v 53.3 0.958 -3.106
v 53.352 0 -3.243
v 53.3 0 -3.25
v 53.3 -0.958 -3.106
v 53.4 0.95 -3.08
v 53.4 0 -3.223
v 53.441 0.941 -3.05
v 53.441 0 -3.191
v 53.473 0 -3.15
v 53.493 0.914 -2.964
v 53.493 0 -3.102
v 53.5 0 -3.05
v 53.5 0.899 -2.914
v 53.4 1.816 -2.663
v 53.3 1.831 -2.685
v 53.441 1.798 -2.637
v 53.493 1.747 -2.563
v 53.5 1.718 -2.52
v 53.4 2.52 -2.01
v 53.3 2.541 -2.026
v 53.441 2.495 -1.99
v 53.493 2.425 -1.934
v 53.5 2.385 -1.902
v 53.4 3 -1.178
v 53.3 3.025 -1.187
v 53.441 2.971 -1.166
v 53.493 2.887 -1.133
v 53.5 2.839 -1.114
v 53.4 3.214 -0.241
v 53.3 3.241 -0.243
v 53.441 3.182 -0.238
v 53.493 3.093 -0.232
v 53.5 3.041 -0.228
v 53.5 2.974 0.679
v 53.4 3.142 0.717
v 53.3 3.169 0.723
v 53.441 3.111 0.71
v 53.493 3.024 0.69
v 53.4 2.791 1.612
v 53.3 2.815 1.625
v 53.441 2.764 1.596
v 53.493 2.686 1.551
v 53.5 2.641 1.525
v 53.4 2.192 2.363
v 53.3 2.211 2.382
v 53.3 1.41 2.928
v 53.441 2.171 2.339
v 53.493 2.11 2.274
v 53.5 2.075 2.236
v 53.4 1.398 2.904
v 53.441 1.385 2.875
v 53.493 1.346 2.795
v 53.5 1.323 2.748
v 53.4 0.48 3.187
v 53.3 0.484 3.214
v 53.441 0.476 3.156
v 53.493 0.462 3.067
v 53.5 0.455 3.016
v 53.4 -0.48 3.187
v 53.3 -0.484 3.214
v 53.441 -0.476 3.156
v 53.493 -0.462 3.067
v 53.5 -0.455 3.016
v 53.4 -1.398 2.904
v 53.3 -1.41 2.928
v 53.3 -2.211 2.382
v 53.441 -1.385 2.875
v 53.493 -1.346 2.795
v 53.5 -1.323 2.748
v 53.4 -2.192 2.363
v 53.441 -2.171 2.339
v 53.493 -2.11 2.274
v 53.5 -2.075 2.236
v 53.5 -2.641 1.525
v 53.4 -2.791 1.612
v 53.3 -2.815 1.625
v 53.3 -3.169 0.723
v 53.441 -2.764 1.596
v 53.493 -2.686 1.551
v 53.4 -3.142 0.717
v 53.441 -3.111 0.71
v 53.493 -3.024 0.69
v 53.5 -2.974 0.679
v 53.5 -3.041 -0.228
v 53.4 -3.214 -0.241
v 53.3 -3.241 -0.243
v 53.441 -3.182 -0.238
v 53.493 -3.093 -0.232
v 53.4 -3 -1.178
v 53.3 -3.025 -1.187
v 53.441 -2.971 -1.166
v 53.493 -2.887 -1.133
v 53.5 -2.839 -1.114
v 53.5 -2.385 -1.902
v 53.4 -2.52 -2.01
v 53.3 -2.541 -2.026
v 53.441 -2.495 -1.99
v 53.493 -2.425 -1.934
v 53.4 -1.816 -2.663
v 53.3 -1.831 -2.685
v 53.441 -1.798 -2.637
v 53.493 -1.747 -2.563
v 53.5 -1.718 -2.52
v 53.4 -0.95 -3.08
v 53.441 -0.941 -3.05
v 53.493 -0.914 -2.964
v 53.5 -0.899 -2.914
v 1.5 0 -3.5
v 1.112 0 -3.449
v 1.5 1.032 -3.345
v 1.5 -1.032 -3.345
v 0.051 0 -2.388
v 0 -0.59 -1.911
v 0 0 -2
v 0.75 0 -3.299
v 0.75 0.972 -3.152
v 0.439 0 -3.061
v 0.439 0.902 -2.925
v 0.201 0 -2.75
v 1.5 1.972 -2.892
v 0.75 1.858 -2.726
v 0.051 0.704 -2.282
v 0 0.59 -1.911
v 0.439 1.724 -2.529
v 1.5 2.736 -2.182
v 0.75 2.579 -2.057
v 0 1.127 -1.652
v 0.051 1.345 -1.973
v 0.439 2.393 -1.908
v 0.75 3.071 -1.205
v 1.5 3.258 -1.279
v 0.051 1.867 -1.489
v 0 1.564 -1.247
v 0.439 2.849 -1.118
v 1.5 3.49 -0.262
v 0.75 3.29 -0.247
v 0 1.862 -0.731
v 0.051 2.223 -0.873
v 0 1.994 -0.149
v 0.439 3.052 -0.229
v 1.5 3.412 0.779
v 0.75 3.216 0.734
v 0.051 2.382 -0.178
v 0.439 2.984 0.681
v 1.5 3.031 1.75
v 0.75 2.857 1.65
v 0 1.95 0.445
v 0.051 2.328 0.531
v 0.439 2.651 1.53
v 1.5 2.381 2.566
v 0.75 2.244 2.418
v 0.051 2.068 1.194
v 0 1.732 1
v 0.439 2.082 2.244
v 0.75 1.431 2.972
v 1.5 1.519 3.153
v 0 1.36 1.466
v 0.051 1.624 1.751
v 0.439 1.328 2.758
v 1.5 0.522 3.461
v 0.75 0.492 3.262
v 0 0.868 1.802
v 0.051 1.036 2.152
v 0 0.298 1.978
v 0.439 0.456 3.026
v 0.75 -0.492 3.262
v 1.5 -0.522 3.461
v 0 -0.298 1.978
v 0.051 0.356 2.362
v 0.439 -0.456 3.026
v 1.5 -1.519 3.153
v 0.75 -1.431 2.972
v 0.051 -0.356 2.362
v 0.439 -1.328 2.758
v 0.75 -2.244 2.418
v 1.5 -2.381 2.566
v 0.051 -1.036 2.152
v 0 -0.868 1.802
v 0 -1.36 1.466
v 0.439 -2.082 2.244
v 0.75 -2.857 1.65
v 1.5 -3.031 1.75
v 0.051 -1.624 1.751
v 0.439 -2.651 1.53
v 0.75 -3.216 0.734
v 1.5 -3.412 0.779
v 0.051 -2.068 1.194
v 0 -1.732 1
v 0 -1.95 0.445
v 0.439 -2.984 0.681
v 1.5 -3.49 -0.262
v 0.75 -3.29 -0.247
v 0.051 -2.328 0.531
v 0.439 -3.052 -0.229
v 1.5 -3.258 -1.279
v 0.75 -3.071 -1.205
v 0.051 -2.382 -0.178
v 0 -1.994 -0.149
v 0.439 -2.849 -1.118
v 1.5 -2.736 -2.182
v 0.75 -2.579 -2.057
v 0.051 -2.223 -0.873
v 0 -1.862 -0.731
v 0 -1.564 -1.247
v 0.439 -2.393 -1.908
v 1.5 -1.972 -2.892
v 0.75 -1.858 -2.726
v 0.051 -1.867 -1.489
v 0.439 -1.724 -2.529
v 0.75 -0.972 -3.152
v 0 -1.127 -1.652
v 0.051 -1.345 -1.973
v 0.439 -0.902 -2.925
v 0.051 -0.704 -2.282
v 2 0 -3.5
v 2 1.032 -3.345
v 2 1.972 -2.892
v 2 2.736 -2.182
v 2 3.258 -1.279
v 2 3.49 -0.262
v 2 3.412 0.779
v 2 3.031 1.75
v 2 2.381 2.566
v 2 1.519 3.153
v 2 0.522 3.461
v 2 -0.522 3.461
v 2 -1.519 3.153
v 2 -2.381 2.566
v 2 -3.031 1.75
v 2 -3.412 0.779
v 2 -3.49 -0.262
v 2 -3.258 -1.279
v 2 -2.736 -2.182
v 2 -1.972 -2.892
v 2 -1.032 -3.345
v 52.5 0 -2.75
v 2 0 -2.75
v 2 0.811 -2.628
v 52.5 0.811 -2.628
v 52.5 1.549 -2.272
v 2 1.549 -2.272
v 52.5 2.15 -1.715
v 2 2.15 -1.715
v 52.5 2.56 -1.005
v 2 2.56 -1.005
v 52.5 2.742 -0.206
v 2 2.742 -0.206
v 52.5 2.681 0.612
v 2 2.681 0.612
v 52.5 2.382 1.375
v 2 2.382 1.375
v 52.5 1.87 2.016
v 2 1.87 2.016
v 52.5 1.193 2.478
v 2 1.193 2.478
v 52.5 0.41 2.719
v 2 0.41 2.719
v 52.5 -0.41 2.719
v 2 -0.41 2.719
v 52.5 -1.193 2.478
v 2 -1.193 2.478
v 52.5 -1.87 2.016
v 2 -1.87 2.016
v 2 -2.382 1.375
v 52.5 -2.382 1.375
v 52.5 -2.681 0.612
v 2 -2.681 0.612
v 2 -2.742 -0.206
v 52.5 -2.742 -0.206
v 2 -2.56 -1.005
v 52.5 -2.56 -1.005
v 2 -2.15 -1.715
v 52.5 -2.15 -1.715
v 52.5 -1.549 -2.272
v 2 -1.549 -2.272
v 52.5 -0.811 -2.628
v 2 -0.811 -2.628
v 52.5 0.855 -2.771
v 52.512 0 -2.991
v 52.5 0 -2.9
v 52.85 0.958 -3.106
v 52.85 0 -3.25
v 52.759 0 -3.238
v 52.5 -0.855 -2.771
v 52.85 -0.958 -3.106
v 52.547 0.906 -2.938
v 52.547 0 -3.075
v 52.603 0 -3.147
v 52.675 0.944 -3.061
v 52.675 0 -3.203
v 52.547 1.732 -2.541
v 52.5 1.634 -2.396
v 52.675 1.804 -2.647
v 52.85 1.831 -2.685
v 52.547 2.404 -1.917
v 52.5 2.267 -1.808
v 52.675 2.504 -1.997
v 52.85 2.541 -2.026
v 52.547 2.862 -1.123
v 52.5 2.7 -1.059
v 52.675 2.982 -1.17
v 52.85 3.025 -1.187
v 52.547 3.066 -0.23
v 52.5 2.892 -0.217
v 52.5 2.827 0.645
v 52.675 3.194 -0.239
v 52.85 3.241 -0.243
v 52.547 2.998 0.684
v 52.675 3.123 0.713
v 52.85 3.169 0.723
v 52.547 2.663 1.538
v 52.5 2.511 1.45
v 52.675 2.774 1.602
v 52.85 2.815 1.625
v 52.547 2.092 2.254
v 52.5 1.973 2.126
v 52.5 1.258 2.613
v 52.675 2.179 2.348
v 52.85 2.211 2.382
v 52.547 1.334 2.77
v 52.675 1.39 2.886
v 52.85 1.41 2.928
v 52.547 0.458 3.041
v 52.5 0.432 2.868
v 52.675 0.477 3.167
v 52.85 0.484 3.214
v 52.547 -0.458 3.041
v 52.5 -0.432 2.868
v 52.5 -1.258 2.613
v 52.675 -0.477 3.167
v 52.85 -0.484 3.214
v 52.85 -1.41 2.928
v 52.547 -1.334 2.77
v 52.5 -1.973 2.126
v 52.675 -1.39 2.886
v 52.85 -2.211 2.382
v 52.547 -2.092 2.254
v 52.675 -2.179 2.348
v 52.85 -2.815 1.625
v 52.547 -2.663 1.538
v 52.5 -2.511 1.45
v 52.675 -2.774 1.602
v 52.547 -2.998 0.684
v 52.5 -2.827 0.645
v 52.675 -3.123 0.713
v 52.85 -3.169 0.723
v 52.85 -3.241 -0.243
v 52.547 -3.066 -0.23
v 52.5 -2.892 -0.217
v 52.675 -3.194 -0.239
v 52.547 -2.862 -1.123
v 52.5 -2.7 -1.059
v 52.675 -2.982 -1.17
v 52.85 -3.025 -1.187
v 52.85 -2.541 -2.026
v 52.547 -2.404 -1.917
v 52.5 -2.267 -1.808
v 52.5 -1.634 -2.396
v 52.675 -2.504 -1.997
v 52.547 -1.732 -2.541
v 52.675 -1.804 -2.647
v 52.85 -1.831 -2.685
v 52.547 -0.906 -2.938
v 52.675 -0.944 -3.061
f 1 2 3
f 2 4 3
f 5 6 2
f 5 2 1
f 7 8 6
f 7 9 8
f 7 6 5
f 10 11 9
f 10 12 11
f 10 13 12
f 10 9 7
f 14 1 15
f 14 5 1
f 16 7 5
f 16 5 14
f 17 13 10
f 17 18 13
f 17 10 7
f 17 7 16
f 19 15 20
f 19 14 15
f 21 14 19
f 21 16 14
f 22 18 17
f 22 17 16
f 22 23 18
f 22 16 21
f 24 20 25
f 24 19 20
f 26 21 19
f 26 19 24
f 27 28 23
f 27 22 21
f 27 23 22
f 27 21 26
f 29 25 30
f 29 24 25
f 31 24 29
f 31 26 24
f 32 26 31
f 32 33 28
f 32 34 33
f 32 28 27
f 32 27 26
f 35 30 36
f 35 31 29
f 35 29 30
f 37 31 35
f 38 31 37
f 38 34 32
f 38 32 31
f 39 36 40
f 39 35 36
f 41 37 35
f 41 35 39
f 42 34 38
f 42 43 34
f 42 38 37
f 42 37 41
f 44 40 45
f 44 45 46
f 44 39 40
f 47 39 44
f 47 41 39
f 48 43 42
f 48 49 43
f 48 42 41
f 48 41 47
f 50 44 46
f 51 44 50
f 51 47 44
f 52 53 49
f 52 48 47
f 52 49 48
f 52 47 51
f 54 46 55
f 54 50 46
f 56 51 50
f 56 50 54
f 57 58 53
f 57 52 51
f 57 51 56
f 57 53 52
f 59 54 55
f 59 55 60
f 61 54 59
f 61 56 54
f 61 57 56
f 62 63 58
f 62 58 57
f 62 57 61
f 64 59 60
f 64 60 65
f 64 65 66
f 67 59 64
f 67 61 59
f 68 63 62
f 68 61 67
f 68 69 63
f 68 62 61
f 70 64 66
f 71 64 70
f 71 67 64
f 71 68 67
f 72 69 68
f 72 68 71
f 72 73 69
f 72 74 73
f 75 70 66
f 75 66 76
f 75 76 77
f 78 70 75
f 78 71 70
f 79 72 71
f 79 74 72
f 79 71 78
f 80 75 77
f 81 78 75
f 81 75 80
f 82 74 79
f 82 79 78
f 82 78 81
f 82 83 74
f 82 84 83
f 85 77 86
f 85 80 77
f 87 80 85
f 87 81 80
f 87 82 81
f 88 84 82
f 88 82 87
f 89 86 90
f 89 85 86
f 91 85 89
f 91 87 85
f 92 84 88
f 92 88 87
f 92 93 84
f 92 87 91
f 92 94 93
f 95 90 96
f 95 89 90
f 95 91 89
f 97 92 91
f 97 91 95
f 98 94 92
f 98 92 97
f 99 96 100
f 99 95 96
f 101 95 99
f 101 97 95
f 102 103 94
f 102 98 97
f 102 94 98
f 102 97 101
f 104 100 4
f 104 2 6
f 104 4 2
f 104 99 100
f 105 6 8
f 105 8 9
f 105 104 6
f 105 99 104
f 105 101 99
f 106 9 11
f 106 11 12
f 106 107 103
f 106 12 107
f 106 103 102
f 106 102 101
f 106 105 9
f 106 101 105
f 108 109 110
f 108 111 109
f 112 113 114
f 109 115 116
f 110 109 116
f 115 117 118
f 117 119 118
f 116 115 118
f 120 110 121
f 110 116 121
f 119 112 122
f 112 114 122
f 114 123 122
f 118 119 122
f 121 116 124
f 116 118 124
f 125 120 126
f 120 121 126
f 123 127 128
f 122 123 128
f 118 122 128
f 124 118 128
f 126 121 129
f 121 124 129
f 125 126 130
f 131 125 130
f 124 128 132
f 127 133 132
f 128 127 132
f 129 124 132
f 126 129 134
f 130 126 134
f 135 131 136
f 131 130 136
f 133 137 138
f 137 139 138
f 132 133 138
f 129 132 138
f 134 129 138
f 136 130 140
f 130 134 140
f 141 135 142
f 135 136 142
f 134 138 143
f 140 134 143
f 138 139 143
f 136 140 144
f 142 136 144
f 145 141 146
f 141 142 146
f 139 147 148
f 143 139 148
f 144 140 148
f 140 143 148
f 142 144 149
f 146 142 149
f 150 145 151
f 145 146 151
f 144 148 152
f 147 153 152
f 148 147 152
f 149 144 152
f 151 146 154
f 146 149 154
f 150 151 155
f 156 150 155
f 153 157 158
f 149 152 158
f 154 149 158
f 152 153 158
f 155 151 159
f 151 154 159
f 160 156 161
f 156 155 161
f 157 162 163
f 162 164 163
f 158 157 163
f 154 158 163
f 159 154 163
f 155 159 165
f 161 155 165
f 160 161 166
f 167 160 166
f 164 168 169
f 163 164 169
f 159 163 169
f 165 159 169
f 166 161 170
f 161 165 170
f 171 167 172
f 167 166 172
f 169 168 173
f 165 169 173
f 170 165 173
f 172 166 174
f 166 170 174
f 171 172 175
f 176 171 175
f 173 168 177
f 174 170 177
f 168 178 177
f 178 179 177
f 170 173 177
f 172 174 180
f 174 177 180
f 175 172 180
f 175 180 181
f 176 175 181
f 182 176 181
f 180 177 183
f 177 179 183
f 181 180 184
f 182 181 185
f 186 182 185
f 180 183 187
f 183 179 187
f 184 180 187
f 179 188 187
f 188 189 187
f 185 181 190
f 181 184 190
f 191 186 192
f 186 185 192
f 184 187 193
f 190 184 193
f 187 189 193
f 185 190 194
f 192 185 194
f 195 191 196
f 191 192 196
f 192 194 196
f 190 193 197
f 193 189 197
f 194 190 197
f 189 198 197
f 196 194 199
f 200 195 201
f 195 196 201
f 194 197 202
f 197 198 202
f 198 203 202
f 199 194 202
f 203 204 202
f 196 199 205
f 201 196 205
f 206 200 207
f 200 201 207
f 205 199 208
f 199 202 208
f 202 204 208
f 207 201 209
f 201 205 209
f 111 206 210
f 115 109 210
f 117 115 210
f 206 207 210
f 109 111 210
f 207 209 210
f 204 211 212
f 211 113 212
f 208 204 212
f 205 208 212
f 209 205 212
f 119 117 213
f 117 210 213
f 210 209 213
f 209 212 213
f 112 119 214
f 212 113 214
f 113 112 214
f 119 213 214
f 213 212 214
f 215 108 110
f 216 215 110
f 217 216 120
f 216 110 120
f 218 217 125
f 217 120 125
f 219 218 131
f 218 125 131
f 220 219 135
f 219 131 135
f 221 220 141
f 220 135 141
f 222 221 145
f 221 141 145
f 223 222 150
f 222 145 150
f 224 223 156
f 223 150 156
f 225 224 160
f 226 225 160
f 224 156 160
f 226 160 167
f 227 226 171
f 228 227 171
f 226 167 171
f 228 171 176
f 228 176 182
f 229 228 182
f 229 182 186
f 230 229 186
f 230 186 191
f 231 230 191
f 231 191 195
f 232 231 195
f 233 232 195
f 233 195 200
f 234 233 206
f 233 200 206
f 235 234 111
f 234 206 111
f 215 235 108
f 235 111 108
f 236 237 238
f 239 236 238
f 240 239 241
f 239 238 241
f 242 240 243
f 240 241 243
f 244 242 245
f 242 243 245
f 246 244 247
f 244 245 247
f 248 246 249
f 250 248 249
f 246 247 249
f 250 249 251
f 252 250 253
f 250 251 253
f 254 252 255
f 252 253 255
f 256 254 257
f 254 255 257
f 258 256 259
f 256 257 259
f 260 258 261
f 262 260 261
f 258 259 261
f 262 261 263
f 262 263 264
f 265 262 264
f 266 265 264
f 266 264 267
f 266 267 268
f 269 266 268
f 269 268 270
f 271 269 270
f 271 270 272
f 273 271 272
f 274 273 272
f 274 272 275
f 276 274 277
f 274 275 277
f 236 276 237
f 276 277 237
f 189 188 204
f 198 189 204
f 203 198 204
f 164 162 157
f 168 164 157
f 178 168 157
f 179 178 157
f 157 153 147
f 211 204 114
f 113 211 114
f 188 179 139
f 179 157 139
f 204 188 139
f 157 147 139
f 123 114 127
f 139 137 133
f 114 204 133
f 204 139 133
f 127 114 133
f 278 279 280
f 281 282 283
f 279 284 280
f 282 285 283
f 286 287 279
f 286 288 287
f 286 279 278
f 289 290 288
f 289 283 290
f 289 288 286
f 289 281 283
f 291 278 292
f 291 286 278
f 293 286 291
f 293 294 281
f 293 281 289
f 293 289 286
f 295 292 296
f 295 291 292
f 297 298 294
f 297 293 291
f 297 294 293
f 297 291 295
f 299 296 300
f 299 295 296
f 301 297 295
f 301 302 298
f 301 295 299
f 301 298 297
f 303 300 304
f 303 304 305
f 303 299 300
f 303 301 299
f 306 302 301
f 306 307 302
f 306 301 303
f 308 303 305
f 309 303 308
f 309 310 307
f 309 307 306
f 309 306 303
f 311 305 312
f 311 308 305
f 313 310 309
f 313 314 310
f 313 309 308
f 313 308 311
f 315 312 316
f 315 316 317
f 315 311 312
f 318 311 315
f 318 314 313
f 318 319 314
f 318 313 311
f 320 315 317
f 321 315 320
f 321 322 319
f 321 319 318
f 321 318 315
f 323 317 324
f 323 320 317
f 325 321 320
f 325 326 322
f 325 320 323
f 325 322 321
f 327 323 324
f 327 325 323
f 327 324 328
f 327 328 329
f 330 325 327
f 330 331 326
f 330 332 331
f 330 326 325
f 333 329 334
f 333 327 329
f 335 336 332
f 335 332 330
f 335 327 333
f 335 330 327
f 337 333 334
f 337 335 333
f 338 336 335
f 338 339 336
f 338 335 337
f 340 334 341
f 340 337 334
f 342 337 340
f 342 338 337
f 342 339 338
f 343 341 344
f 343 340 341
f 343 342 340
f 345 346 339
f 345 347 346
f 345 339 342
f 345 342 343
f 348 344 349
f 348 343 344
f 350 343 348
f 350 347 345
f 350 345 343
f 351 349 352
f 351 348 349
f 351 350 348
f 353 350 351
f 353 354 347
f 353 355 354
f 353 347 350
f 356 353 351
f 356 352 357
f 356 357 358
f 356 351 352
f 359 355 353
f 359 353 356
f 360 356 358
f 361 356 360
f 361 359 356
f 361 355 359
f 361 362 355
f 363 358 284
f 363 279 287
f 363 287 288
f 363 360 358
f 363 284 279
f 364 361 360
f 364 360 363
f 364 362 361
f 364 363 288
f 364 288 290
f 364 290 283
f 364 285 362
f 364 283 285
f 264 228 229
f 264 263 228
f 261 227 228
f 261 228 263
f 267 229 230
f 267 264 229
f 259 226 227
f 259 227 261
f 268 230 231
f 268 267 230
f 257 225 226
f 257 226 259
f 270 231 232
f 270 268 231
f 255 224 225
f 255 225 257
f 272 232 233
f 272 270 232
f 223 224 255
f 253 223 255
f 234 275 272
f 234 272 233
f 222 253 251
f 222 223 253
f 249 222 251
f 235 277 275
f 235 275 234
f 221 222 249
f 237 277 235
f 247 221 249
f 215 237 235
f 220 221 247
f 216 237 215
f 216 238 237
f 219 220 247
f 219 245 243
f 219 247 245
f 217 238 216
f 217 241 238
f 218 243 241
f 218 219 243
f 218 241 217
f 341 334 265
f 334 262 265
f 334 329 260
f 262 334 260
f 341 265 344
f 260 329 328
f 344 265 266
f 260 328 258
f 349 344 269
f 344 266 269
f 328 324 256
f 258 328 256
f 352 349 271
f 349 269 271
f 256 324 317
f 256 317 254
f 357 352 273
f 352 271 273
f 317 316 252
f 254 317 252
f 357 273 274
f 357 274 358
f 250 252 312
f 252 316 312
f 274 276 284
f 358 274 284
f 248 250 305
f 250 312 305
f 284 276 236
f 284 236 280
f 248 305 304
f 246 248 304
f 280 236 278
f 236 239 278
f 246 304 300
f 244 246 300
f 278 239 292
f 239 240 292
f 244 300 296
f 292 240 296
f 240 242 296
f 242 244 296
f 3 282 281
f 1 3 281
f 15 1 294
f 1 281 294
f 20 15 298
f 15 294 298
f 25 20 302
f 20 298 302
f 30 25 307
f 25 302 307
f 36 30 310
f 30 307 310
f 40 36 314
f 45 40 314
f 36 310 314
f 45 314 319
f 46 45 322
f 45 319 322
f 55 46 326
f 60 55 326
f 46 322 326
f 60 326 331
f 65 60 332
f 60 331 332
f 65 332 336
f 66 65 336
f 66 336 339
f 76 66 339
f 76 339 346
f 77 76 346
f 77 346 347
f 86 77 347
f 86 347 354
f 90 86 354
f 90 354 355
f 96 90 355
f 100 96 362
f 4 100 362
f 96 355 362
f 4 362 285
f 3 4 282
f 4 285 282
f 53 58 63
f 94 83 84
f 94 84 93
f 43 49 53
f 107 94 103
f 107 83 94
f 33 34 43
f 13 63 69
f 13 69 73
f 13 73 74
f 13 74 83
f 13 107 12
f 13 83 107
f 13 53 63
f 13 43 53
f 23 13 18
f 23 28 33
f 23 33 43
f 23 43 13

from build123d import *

# Parameters (mm, degrees)
SKETCH1_R           = 3.5
BOSS_EXTRUDE1_DEPTH = 2
SKETCH2_R           = 2.75
BOSS_EXTRUDE2_DEPTH = 50.5
SKETCH3_R           = 3.25
BOSS_EXTRUDE3_DEPTH = 1
FILLET1_R           = 1.5
FILLET2_R           = 0.35
FILLET3_R           = 0.2


with BuildPart() as part:
    # Sketch1 → Boss-Extrude1 (new body)
    with BuildSketch(Plane(origin=(0, 0, 0), x_dir=(0, 0, -1), z_dir=(1, 0, 0))):
        Circle(SKETCH1_R)
    extrude(amount=BOSS_EXTRUDE1_DEPTH)

    # Sketch2 → Boss-Extrude2 (add)
    with BuildSketch(Plane(origin=(2, 0, 0), x_dir=(0, 0, -1), z_dir=(1, 0, 0))):
        Circle(SKETCH2_R)
    extrude(amount=BOSS_EXTRUDE2_DEPTH)

    # Sketch3 → Boss-Extrude3 (add)
    with BuildSketch(Plane(origin=(52.5, 0, 0), x_dir=(0, 0, -1), z_dir=(1, 0, 0))):
        Circle(SKETCH3_R)
    extrude(amount=BOSS_EXTRUDE3_DEPTH)

    # Fillet1
    fillet1_edges = [part.edges().sort_by_distance(p)[0] for p in [
        (0, 0, 3.5),
    ]]
    fillet(fillet1_edges, radius=FILLET1_R)

    # Fillet2
    fillet2_edges = [part.edges().sort_by_distance(p)[0] for p in [
        (52.5, 0, 3.25),
    ]]
    fillet(fillet2_edges, radius=FILLET2_R)

    # Fillet3
    fillet3_edges = [part.edges().sort_by_distance(p)[0] for p in [
        (53.5, 0, 3.25),
    ]]
    fillet(fillet3_edges, radius=FILLET3_R)


solid = part.part
